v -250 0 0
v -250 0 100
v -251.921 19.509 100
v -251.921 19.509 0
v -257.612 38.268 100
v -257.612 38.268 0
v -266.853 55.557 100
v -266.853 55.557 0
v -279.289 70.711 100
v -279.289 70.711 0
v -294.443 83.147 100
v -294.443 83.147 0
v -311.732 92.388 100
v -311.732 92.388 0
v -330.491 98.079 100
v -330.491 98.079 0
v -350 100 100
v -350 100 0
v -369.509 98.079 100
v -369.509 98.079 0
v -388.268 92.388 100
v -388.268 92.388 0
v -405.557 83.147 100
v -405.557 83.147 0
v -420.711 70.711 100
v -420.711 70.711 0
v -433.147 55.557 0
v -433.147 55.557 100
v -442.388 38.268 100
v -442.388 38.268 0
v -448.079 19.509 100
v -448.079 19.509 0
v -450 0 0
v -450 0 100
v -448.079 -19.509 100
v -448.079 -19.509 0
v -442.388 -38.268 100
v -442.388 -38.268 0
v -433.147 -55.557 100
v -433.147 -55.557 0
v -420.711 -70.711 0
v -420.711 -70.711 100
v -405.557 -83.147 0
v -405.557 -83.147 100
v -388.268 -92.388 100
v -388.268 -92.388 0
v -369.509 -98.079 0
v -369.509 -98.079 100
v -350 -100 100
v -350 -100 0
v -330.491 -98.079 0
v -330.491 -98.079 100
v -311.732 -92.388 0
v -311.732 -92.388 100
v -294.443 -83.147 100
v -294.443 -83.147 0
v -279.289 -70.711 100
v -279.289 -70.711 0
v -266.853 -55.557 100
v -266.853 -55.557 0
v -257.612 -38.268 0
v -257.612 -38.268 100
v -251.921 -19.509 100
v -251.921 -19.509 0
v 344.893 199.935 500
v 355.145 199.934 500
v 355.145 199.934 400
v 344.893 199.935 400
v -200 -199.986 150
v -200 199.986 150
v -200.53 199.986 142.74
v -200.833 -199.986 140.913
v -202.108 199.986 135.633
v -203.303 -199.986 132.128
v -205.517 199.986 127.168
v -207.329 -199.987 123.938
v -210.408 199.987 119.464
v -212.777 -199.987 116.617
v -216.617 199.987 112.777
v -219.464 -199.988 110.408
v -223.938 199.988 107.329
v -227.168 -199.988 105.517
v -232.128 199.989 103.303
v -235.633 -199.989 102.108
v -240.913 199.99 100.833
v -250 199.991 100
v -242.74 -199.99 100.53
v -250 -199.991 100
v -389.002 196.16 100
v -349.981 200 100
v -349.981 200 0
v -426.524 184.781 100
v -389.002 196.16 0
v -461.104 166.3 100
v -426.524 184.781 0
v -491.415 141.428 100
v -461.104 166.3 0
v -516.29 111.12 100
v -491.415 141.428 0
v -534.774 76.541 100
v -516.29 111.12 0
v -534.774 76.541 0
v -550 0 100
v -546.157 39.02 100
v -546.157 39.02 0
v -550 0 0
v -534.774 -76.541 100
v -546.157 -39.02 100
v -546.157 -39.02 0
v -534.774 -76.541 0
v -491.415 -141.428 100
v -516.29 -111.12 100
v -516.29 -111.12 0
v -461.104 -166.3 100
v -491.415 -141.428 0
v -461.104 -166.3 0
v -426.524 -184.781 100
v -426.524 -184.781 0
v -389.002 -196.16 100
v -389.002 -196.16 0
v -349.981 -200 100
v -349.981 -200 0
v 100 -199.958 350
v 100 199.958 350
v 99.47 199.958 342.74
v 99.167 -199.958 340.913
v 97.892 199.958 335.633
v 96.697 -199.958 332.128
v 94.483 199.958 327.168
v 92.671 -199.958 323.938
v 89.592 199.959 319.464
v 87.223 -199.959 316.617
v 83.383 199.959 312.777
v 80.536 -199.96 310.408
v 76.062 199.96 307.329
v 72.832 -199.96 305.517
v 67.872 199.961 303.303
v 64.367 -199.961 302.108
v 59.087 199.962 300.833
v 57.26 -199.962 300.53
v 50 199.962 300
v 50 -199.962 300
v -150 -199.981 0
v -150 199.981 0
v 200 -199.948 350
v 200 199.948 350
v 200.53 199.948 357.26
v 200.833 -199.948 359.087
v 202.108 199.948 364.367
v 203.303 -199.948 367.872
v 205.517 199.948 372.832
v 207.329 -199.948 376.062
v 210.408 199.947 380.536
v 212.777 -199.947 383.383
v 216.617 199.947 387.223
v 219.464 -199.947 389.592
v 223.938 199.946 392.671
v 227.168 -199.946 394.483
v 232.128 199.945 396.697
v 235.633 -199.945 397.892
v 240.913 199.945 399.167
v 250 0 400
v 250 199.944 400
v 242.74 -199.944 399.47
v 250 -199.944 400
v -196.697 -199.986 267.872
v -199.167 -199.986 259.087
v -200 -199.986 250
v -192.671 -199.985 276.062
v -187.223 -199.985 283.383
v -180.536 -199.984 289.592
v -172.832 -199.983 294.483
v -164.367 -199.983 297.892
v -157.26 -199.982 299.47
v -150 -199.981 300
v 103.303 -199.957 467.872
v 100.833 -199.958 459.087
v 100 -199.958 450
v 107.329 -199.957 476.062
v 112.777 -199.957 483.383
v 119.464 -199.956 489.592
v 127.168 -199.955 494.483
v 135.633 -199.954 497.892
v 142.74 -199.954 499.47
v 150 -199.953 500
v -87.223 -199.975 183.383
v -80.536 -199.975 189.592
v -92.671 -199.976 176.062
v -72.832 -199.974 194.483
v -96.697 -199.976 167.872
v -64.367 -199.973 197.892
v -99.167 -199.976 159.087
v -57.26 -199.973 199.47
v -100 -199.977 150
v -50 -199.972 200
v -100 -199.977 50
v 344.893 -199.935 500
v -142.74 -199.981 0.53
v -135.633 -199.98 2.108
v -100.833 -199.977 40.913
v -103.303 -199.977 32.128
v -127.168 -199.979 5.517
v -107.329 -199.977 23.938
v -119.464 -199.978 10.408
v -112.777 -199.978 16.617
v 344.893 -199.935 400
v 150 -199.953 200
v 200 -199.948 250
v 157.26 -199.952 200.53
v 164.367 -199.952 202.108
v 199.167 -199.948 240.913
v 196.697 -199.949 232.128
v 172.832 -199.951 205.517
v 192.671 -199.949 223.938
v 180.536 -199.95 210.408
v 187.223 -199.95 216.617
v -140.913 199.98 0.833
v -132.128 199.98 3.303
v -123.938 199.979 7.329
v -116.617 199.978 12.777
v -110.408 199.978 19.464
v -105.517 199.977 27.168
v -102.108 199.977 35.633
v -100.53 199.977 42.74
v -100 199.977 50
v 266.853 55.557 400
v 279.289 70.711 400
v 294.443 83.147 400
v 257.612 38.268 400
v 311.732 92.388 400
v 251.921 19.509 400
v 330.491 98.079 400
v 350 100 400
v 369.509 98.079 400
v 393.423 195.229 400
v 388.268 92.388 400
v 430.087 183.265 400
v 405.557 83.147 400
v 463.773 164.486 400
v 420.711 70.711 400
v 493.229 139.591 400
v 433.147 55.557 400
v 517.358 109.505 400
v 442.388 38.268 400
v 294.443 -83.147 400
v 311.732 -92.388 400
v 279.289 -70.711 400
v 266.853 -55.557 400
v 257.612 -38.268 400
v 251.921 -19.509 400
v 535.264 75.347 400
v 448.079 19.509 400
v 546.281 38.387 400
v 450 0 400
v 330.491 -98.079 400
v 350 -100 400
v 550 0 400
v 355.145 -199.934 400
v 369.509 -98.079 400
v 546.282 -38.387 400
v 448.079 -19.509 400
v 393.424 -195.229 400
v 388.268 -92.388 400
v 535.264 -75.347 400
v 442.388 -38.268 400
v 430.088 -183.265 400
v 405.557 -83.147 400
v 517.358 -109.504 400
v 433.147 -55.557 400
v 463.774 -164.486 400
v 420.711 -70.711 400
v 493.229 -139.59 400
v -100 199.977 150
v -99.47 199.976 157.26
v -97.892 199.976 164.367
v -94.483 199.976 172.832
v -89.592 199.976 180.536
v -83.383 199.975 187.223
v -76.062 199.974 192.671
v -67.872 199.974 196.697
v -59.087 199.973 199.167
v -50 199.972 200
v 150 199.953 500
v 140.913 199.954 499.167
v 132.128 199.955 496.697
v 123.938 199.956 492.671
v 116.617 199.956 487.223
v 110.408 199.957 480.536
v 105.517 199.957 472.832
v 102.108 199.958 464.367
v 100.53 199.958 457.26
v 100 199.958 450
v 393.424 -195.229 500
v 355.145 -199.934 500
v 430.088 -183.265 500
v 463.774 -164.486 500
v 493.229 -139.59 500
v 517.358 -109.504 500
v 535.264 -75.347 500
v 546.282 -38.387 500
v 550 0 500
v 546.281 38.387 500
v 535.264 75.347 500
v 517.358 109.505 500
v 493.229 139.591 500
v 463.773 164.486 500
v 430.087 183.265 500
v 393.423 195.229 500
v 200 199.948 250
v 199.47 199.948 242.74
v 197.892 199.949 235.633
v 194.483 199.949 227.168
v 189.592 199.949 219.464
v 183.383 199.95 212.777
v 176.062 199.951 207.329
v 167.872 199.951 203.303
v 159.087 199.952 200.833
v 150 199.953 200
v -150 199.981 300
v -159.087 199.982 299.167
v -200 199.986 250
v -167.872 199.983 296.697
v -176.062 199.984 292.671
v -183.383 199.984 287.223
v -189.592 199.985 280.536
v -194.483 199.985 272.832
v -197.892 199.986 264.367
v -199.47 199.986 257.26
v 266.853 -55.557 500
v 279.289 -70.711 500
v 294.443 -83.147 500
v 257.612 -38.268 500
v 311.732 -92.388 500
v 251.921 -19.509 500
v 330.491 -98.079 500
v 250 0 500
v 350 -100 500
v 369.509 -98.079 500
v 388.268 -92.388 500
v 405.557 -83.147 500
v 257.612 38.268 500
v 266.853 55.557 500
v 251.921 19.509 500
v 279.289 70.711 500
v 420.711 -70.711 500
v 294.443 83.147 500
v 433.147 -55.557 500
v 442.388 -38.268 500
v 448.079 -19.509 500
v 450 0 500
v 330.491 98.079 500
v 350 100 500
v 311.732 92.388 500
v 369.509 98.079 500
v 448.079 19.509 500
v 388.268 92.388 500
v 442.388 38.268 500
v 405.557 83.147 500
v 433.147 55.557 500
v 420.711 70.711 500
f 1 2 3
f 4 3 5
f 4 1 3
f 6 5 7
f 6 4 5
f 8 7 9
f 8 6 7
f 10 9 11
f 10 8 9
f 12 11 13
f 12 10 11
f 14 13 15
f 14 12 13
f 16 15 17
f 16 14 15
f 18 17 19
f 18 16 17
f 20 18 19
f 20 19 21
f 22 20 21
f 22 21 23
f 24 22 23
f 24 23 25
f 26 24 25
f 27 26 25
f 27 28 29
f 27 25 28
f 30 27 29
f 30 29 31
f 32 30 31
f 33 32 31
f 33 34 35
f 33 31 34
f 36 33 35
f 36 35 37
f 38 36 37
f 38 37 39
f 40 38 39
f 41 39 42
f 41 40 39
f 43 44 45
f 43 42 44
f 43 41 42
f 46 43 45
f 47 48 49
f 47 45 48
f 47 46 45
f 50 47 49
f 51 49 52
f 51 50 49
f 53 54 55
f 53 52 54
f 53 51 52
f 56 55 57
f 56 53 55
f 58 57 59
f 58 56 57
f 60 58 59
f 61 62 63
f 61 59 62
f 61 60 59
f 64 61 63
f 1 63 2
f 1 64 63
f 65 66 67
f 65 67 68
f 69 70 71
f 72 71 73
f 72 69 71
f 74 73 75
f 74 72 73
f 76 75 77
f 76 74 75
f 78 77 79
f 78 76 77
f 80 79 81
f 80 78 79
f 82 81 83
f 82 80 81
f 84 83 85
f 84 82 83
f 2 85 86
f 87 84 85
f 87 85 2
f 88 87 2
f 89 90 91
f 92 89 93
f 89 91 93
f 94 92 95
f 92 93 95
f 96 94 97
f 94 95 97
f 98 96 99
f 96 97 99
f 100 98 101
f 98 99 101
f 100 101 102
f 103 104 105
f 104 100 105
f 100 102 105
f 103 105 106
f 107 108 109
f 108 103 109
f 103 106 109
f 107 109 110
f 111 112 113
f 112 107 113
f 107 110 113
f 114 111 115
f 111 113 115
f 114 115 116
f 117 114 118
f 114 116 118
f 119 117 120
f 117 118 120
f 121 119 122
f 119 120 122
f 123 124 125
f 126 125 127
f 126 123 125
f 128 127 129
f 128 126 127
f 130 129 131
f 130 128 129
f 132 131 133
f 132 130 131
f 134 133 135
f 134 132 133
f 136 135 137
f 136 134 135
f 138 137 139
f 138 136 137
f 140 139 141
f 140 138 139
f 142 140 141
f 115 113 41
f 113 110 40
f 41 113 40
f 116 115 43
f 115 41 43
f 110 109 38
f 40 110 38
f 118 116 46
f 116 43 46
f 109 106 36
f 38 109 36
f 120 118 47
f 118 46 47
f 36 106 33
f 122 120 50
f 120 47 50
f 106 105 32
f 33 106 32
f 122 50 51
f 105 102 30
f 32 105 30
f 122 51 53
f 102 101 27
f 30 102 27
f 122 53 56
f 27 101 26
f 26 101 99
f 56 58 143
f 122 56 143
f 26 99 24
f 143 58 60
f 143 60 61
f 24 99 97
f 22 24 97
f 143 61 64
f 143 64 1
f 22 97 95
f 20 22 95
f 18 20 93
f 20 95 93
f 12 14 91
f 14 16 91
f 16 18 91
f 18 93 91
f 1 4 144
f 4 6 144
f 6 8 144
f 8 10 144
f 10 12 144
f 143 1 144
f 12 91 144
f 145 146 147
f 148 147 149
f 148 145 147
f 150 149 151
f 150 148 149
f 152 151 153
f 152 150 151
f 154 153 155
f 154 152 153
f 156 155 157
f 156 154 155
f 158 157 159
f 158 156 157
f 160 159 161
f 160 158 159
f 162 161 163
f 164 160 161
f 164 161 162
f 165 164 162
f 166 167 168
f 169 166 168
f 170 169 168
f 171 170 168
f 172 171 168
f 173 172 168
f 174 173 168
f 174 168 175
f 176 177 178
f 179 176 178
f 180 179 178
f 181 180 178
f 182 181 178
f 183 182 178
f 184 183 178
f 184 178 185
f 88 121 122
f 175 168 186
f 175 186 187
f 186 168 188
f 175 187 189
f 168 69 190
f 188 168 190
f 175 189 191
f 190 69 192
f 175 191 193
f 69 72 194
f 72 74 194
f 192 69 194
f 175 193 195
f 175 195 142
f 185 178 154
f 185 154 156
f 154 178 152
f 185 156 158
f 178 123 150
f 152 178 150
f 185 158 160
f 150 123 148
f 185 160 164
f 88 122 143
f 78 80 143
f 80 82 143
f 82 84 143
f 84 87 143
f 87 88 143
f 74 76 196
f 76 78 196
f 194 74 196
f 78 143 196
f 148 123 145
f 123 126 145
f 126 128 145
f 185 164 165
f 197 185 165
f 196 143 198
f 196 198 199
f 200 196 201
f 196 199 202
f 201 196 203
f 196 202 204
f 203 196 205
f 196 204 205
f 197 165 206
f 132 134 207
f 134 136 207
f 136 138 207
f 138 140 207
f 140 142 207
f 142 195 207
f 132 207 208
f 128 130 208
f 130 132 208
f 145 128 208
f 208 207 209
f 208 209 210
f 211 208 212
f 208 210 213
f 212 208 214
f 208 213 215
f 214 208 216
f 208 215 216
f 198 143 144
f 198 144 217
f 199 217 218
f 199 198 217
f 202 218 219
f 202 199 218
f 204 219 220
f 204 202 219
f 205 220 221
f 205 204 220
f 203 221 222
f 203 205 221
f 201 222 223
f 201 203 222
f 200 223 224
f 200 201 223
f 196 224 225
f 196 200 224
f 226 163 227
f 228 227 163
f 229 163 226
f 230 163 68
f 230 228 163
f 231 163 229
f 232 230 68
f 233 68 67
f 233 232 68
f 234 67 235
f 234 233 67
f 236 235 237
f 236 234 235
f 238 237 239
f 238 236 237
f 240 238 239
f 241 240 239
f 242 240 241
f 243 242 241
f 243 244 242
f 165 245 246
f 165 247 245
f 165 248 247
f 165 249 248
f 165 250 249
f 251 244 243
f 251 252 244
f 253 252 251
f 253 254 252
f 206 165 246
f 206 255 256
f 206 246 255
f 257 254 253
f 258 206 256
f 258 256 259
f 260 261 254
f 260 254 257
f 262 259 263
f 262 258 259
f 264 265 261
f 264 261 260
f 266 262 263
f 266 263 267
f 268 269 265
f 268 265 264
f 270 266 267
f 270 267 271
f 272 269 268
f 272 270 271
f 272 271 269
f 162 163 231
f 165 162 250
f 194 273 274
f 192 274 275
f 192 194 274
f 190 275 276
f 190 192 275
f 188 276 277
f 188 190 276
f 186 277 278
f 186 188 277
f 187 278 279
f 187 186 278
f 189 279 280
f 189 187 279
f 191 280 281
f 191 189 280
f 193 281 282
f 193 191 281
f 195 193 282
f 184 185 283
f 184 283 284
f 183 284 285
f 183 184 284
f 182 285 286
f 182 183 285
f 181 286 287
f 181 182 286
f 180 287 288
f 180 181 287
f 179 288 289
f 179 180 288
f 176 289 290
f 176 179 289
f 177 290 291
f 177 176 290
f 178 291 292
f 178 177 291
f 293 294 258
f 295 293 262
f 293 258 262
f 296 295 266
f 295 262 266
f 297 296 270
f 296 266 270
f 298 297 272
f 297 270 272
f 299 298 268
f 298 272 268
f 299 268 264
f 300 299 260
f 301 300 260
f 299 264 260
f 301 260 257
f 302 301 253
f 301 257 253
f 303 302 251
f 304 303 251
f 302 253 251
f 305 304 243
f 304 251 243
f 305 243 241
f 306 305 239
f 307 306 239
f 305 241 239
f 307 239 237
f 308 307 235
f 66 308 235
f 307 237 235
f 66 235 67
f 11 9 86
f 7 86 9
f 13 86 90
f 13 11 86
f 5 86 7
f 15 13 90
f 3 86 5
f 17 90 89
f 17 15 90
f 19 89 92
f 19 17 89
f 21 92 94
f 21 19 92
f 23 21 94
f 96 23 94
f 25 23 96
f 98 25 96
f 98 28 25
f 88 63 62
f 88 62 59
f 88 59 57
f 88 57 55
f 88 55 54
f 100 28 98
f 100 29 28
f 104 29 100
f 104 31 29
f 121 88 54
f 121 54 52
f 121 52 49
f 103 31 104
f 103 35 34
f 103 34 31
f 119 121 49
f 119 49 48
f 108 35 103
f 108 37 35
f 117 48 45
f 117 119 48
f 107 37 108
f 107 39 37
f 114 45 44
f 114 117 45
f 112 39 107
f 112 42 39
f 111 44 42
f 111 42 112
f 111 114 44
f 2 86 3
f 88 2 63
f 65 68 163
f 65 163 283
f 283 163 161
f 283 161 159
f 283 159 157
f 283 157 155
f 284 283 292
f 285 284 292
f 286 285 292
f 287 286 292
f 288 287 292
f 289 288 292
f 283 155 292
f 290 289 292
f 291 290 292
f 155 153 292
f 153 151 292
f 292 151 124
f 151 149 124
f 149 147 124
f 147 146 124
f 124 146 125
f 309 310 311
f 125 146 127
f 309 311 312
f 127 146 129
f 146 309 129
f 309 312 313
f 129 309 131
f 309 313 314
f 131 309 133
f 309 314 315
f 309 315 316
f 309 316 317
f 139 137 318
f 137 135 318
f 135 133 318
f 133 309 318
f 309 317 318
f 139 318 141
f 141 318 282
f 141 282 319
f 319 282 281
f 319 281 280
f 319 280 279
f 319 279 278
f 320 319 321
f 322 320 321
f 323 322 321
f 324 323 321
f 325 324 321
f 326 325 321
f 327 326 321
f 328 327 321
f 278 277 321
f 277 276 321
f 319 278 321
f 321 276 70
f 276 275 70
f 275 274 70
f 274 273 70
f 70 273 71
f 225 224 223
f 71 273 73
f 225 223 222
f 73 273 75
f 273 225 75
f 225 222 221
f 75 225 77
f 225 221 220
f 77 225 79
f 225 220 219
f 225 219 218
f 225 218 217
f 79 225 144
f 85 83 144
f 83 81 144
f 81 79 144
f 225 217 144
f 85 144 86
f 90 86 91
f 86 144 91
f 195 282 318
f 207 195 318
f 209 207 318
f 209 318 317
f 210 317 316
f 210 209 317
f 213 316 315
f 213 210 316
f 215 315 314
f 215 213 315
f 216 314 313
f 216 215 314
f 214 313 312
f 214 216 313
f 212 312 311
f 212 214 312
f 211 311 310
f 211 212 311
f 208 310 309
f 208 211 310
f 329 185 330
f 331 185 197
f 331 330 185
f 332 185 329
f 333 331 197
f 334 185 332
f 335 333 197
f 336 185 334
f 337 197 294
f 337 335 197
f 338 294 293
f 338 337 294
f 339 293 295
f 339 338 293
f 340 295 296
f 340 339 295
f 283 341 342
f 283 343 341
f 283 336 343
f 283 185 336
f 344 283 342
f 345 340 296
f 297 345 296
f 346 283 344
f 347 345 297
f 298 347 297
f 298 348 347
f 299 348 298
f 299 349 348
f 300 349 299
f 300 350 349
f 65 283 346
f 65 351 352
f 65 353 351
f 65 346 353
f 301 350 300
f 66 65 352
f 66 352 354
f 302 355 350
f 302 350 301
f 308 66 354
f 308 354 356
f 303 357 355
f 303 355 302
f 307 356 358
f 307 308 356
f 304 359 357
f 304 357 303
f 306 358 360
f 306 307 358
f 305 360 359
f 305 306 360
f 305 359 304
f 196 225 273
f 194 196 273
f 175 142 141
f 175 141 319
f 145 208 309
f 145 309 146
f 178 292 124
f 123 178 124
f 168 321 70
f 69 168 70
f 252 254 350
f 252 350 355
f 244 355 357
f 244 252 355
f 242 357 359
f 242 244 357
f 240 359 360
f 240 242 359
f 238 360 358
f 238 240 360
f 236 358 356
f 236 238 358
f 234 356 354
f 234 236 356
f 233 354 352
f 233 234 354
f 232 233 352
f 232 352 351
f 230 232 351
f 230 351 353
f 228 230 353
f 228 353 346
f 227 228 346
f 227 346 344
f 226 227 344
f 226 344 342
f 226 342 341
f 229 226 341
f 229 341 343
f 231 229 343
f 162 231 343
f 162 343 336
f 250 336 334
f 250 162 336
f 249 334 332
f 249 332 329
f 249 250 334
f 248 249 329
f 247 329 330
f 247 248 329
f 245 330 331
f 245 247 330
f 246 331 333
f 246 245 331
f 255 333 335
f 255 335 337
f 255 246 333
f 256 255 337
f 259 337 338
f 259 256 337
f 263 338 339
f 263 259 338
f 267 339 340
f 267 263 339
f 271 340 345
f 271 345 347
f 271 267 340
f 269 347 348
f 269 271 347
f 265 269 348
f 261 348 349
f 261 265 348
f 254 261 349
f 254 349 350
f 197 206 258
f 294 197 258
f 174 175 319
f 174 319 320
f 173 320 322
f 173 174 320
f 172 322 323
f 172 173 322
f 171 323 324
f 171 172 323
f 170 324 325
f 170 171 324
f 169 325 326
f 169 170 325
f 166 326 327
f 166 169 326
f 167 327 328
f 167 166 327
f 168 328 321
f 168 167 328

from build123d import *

# Parameters (mm, degrees)
F0_R     = 100
F1_DEPTH = 500
F3_DEPTH = 300


# Not quite as in the source:
# - ends of sketch curves that miss each other by under 0.0002 mm in the source are joined


with BuildPart() as f1:
    # F0 (on Top) → F1 (new body)
    with BuildSketch(Plane.XY):
        with BuildLine():
            Line((344.892811266, 199.9347809243), (-349.9812287722, 199.9999991191))
            ThreePointArc((-349.9812287722, 199.9999991191), (-550, 0), (-349.9812287722, -199.9999991191))
            Line((-349.9812287722, -199.9999991191), (344.892811266, -199.9347809243))
            Line((344.892811266, -199.9347809243), (355.1449138709, -199.9338187015))
            ThreePointArc((355.1449138709, -199.9338187015), (550, 9.74749e-05), (355.1447188571, 199.9338187198))
            Line((355.1447188571, 199.9338187198), (344.892811266, 199.9347809243))
        make_face()
        with Locations((-350, 0)):
            Circle(F0_R, mode=Mode.SUBTRACT)
        with Locations((350, 0)):
            Circle(F0_R, mode=Mode.SUBTRACT)
    extrude(amount=F1_DEPTH)


with BuildPart() as f3:
    # F2 (on Front) → F3 (new body, symmetric)
    with BuildSketch(Plane.XZ):
        with BuildLine():
            Line((-550, 100), (-550, 0))
            Line((-550, 0), (-150, 0))
            ThreePointArc((-150, 0), (-114.6446609407, 14.6446609407), (-100, 50))
            Line((-100, 50), (-100, 150))
            ThreePointArc((-100, 150), (-85.3553390593, 185.3553390593), (-50, 200))
            Line((-50, 200), (150, 200))
            ThreePointArc((150, 200), (185.3553390593, 214.6446609407), (200, 250))
            Line((200, 250), (200, 350))
            ThreePointArc((200, 350), (214.6446609407, 385.3553390593), (250, 400))
            Line((250, 400), (550, 400))
            Line((550, 400), (550, 500))
            Line((550, 500), (150, 500))
            ThreePointArc((150, 500), (114.6446609407, 485.3553390593), (100, 450))
            Line((100, 450), (100, 350))
            ThreePointArc((100, 350), (85.3553390593, 314.6446609407), (50, 300))
            Line((50, 300), (-150, 300))
            ThreePointArc((-150, 300), (-185.3553390593, 285.3553390593), (-200, 250))
            Line((-200, 250), (-200, 150))
            ThreePointArc((-200, 150), (-214.6446609407, 114.6446609407), (-250, 100))
            Line((-250, 100), (-550, 100))
        make_face()
    extrude(amount=F3_DEPTH, both=True)


with BuildPart() as f1_1:
    add(f1.part)

    # F4: intersect F3
    add(f3.part, mode=Mode.INTERSECT)


solid = f1_1.part
